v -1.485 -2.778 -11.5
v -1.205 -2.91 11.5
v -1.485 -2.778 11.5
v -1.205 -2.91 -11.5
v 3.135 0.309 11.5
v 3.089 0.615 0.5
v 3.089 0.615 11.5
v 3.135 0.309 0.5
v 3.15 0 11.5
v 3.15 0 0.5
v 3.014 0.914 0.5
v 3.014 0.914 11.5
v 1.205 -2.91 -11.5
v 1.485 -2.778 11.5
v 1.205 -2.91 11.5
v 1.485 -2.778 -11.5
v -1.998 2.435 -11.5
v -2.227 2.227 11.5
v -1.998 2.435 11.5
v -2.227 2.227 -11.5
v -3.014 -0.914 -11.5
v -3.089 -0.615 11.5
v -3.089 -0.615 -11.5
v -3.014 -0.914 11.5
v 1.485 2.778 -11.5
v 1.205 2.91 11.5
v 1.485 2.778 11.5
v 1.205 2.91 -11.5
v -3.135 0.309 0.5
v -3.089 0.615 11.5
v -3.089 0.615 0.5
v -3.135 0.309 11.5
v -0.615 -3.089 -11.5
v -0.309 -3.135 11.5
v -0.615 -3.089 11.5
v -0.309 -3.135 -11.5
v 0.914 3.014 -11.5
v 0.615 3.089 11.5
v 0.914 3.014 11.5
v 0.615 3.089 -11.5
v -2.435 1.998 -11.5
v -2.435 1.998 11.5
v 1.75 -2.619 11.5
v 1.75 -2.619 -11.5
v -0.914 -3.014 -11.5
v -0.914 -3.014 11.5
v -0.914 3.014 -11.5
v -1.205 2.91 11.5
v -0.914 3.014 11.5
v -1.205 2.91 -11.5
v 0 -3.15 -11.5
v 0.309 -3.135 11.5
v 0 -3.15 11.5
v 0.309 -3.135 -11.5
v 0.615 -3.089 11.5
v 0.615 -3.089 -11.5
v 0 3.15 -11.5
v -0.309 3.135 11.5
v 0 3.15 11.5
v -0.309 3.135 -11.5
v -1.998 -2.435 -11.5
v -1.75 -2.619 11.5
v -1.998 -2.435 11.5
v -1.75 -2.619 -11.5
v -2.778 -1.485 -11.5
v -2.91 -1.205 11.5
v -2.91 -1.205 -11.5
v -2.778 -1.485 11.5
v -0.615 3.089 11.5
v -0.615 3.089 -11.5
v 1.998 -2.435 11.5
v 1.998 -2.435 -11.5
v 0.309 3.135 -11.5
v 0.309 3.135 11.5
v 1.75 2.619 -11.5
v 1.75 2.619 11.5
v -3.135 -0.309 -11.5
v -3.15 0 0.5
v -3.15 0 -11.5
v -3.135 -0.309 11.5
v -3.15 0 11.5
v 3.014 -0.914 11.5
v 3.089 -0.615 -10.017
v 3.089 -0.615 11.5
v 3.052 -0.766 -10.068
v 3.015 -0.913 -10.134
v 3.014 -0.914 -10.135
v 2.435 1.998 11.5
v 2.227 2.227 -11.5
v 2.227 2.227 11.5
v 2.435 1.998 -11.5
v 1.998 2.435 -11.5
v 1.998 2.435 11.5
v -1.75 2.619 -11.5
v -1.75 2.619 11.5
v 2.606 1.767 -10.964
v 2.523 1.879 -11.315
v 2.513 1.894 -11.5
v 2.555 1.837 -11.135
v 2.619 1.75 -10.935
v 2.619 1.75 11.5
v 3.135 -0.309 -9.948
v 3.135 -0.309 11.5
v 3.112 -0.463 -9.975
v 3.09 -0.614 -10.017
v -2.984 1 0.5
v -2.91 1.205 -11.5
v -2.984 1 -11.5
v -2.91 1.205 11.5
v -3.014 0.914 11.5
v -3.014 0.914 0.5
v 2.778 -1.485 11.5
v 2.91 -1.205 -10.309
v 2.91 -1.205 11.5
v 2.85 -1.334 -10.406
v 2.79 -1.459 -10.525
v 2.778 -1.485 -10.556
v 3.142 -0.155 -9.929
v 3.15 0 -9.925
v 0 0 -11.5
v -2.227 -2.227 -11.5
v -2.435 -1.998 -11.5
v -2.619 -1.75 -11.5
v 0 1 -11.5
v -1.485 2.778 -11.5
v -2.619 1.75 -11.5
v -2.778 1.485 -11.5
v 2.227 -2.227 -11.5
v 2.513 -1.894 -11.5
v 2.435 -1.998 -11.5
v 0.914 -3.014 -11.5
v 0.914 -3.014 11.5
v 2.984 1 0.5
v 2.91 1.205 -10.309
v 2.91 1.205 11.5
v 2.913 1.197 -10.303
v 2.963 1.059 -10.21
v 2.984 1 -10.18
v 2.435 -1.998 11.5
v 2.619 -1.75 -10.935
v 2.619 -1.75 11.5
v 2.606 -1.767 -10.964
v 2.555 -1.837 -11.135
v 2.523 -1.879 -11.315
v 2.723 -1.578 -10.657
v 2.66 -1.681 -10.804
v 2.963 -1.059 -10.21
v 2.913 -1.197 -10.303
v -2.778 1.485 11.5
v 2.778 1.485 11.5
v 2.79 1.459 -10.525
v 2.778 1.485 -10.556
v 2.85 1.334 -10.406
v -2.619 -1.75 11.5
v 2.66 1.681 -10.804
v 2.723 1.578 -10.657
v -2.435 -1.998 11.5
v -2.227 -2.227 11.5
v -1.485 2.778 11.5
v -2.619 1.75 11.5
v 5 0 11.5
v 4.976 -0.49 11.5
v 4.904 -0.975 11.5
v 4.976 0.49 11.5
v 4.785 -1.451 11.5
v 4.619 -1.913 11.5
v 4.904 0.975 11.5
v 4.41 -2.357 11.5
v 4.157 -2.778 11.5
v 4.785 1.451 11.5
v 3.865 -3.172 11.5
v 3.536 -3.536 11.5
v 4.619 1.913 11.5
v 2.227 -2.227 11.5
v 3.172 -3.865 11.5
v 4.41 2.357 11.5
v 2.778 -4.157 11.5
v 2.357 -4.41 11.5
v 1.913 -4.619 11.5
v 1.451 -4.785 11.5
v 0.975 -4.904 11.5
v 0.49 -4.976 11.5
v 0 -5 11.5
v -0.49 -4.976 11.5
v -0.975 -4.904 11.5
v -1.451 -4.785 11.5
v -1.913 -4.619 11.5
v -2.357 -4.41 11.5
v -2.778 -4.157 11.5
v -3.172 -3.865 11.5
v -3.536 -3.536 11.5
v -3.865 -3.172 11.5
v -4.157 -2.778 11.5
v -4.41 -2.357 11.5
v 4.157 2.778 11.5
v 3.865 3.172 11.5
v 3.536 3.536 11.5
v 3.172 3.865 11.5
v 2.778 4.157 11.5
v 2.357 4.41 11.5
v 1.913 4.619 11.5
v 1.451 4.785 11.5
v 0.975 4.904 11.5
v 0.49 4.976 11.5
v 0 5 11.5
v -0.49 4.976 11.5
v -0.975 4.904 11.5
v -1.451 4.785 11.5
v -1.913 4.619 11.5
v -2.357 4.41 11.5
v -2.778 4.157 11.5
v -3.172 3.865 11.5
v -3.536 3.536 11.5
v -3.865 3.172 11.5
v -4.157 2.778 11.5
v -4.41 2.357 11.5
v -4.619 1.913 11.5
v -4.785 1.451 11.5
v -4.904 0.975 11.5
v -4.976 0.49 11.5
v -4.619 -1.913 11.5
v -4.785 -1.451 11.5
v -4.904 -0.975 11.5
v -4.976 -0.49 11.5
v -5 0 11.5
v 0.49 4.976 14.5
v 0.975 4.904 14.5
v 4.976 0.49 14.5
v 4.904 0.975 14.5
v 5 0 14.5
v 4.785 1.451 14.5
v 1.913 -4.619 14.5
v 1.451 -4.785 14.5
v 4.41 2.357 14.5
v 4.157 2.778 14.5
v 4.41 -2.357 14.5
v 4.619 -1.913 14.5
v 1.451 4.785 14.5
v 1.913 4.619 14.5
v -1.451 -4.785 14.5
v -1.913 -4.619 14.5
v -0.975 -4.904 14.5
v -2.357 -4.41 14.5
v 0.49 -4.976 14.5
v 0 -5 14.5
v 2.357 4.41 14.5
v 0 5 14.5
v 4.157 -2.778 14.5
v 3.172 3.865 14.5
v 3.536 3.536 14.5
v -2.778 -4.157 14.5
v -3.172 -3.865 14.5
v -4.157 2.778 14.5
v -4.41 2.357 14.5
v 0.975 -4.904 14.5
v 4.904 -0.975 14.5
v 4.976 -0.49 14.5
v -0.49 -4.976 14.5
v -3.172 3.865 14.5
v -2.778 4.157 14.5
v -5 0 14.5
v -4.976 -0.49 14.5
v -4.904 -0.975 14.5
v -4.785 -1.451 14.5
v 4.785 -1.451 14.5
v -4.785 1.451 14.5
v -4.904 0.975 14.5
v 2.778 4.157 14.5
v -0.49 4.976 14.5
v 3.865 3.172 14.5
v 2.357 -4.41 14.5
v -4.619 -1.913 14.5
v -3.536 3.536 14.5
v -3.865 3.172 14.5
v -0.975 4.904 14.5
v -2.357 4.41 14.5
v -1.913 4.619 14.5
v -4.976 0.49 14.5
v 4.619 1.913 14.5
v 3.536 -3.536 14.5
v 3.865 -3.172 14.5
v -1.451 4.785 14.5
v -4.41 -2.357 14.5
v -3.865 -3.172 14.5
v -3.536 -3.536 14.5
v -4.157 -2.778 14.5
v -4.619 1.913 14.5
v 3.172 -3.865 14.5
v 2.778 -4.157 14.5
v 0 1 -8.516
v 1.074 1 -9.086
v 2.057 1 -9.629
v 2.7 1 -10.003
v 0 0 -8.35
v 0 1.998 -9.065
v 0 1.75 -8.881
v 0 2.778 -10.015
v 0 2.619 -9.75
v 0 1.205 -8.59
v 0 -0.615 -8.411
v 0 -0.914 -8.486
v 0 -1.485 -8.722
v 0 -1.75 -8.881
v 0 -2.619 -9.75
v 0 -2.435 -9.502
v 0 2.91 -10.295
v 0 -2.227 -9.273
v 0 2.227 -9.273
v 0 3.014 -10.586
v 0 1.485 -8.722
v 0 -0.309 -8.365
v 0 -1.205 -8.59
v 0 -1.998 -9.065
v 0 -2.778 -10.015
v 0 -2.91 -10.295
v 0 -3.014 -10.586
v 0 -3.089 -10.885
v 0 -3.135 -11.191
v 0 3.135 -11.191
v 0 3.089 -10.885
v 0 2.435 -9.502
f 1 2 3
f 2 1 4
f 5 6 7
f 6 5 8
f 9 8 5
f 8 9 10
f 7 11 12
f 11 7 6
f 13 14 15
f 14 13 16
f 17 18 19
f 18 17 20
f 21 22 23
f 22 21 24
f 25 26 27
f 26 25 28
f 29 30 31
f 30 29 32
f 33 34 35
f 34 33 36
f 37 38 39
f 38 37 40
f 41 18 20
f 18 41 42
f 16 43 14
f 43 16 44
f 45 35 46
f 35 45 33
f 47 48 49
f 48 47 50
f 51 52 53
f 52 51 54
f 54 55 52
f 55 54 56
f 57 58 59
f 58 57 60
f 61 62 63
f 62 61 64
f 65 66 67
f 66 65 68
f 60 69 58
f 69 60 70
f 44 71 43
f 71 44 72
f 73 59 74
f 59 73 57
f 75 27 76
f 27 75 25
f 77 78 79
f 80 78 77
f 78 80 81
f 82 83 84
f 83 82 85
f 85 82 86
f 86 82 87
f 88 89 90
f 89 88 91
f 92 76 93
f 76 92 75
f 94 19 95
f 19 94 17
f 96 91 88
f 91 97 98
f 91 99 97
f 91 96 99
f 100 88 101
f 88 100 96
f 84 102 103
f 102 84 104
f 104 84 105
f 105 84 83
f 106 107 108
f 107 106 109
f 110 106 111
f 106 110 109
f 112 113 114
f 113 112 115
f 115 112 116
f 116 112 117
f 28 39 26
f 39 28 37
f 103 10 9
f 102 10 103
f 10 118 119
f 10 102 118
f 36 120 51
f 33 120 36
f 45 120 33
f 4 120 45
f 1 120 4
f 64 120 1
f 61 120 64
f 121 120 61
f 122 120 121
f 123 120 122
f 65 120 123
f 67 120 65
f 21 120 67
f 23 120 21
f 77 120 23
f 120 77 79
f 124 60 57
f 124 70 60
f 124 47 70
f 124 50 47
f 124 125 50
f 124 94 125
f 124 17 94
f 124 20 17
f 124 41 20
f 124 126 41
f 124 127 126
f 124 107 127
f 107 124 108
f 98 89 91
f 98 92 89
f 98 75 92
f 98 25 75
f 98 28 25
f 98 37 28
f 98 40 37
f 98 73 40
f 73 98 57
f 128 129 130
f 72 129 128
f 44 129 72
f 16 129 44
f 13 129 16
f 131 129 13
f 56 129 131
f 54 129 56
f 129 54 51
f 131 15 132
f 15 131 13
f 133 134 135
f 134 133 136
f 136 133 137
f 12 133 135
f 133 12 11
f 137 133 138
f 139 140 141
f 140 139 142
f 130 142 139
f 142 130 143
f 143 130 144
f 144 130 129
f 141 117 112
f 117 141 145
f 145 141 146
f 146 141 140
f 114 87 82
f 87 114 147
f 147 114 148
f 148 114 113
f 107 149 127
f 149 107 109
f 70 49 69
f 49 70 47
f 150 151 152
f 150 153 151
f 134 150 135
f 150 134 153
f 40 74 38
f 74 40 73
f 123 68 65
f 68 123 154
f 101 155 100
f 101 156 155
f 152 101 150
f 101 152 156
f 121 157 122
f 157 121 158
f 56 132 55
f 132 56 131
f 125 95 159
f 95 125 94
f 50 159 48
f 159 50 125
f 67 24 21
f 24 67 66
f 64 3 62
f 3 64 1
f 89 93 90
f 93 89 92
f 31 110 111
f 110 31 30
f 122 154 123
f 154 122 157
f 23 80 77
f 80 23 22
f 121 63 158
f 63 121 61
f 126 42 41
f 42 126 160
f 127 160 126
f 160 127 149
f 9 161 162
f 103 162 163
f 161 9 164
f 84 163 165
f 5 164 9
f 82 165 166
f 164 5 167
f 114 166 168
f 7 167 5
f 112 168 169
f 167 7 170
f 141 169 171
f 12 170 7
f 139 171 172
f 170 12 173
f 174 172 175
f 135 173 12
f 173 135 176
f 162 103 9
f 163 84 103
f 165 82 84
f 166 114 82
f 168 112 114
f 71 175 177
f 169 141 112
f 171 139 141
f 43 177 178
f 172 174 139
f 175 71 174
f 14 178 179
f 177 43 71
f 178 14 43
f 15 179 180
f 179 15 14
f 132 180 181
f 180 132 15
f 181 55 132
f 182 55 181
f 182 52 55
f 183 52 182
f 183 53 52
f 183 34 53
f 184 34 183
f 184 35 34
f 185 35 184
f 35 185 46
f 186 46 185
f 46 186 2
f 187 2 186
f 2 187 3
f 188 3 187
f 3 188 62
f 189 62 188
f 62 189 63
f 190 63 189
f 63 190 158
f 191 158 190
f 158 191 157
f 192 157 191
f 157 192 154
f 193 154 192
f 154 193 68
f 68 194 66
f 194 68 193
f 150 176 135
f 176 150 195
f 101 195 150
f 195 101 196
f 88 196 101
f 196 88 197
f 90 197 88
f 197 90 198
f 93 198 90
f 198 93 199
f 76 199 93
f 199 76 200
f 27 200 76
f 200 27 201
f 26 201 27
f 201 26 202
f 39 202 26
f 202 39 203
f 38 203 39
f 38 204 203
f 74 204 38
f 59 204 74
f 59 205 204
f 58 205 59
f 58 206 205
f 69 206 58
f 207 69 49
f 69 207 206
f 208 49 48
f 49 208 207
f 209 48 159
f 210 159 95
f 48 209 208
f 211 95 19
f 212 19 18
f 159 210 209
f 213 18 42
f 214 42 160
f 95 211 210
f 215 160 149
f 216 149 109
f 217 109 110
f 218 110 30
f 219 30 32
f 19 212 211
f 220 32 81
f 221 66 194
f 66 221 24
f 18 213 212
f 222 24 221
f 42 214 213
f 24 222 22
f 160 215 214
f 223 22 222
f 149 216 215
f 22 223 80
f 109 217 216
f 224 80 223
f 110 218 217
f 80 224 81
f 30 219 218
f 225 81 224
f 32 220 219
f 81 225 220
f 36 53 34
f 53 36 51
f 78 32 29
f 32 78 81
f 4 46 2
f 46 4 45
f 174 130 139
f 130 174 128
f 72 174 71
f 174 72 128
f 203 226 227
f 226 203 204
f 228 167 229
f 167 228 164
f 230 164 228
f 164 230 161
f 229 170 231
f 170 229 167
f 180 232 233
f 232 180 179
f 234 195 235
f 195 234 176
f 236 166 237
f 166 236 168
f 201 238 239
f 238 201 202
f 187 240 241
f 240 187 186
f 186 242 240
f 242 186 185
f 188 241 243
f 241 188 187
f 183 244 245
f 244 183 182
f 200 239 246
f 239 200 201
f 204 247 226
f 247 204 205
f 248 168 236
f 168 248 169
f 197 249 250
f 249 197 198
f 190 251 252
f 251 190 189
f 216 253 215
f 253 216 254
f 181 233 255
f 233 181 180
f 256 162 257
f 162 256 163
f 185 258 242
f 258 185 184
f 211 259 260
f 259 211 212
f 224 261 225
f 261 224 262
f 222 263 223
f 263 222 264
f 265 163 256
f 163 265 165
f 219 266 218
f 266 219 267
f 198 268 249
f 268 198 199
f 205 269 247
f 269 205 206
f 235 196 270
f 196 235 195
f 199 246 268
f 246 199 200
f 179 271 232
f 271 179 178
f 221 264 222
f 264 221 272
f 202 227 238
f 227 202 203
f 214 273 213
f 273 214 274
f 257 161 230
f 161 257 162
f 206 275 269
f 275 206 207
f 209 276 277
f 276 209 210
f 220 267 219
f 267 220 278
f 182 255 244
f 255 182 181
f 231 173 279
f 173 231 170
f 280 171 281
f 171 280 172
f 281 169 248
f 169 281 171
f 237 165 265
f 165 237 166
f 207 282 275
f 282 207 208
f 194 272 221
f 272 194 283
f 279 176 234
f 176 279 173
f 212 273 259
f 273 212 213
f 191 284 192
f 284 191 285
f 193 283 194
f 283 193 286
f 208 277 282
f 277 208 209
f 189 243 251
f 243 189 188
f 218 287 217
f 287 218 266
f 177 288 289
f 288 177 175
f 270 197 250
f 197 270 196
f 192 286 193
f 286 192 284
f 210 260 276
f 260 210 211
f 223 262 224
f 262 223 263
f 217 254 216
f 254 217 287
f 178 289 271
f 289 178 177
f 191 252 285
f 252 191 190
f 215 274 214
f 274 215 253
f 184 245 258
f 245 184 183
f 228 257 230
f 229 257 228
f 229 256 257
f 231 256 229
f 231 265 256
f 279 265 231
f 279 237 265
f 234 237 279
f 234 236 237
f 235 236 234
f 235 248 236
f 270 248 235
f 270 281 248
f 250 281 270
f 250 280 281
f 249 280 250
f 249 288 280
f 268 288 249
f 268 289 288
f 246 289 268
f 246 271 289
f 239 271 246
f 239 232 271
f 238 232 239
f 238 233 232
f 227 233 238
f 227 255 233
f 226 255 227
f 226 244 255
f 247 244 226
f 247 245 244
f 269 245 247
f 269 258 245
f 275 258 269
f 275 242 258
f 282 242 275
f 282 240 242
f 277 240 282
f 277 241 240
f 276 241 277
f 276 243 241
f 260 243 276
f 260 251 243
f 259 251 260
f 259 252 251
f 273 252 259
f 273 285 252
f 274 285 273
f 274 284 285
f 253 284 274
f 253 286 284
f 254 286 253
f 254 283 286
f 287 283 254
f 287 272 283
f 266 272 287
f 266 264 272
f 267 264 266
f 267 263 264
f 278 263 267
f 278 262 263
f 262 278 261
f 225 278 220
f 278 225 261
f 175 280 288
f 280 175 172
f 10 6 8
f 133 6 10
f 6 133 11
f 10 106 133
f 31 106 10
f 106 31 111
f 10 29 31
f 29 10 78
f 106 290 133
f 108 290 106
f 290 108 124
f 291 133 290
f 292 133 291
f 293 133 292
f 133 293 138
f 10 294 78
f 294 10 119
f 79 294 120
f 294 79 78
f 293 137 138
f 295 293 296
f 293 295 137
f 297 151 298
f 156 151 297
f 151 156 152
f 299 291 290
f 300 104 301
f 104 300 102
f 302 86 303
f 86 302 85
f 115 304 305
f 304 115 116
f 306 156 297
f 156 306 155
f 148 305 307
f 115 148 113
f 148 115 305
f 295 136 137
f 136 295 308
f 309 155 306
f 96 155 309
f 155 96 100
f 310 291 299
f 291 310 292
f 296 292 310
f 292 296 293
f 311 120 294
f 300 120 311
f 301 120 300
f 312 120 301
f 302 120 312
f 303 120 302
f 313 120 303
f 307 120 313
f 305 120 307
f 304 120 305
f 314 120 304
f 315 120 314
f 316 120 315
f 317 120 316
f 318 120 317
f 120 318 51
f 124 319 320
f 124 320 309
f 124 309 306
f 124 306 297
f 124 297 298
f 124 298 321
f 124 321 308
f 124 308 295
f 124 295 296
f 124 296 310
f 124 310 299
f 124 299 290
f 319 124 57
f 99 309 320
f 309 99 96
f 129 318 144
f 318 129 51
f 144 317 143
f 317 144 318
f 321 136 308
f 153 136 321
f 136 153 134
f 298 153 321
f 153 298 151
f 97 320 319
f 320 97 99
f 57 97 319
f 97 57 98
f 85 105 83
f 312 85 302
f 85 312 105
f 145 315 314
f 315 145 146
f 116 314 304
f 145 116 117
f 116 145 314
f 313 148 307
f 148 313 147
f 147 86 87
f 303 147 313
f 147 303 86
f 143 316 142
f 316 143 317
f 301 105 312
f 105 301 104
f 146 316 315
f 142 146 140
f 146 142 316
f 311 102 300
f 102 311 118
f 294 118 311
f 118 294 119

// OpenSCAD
module fastener() {
    difference() {
        union() {
            // Cylindrical shank
            translate([0, 0, -11.5])
                cylinder(h=23, d=6.3, $fn=64);
            
            // Circular head
            translate([0, 0, 11.5])
                cylinder(h=3, d=10, $fn=64);
        }
        
        // Longitudinal slot for the split tip
        translate([-3.15, 0, -11.5])
            cube([6.3, 1, 12]);
        
        // Tapered wedge-shaped legs
        translate([0, 0, -11.5])
            rotate([0, 90, 0])
                cylinder(h=6.3, r1=3.15, r2=0, $fn=64);
    }
}

fastener();
